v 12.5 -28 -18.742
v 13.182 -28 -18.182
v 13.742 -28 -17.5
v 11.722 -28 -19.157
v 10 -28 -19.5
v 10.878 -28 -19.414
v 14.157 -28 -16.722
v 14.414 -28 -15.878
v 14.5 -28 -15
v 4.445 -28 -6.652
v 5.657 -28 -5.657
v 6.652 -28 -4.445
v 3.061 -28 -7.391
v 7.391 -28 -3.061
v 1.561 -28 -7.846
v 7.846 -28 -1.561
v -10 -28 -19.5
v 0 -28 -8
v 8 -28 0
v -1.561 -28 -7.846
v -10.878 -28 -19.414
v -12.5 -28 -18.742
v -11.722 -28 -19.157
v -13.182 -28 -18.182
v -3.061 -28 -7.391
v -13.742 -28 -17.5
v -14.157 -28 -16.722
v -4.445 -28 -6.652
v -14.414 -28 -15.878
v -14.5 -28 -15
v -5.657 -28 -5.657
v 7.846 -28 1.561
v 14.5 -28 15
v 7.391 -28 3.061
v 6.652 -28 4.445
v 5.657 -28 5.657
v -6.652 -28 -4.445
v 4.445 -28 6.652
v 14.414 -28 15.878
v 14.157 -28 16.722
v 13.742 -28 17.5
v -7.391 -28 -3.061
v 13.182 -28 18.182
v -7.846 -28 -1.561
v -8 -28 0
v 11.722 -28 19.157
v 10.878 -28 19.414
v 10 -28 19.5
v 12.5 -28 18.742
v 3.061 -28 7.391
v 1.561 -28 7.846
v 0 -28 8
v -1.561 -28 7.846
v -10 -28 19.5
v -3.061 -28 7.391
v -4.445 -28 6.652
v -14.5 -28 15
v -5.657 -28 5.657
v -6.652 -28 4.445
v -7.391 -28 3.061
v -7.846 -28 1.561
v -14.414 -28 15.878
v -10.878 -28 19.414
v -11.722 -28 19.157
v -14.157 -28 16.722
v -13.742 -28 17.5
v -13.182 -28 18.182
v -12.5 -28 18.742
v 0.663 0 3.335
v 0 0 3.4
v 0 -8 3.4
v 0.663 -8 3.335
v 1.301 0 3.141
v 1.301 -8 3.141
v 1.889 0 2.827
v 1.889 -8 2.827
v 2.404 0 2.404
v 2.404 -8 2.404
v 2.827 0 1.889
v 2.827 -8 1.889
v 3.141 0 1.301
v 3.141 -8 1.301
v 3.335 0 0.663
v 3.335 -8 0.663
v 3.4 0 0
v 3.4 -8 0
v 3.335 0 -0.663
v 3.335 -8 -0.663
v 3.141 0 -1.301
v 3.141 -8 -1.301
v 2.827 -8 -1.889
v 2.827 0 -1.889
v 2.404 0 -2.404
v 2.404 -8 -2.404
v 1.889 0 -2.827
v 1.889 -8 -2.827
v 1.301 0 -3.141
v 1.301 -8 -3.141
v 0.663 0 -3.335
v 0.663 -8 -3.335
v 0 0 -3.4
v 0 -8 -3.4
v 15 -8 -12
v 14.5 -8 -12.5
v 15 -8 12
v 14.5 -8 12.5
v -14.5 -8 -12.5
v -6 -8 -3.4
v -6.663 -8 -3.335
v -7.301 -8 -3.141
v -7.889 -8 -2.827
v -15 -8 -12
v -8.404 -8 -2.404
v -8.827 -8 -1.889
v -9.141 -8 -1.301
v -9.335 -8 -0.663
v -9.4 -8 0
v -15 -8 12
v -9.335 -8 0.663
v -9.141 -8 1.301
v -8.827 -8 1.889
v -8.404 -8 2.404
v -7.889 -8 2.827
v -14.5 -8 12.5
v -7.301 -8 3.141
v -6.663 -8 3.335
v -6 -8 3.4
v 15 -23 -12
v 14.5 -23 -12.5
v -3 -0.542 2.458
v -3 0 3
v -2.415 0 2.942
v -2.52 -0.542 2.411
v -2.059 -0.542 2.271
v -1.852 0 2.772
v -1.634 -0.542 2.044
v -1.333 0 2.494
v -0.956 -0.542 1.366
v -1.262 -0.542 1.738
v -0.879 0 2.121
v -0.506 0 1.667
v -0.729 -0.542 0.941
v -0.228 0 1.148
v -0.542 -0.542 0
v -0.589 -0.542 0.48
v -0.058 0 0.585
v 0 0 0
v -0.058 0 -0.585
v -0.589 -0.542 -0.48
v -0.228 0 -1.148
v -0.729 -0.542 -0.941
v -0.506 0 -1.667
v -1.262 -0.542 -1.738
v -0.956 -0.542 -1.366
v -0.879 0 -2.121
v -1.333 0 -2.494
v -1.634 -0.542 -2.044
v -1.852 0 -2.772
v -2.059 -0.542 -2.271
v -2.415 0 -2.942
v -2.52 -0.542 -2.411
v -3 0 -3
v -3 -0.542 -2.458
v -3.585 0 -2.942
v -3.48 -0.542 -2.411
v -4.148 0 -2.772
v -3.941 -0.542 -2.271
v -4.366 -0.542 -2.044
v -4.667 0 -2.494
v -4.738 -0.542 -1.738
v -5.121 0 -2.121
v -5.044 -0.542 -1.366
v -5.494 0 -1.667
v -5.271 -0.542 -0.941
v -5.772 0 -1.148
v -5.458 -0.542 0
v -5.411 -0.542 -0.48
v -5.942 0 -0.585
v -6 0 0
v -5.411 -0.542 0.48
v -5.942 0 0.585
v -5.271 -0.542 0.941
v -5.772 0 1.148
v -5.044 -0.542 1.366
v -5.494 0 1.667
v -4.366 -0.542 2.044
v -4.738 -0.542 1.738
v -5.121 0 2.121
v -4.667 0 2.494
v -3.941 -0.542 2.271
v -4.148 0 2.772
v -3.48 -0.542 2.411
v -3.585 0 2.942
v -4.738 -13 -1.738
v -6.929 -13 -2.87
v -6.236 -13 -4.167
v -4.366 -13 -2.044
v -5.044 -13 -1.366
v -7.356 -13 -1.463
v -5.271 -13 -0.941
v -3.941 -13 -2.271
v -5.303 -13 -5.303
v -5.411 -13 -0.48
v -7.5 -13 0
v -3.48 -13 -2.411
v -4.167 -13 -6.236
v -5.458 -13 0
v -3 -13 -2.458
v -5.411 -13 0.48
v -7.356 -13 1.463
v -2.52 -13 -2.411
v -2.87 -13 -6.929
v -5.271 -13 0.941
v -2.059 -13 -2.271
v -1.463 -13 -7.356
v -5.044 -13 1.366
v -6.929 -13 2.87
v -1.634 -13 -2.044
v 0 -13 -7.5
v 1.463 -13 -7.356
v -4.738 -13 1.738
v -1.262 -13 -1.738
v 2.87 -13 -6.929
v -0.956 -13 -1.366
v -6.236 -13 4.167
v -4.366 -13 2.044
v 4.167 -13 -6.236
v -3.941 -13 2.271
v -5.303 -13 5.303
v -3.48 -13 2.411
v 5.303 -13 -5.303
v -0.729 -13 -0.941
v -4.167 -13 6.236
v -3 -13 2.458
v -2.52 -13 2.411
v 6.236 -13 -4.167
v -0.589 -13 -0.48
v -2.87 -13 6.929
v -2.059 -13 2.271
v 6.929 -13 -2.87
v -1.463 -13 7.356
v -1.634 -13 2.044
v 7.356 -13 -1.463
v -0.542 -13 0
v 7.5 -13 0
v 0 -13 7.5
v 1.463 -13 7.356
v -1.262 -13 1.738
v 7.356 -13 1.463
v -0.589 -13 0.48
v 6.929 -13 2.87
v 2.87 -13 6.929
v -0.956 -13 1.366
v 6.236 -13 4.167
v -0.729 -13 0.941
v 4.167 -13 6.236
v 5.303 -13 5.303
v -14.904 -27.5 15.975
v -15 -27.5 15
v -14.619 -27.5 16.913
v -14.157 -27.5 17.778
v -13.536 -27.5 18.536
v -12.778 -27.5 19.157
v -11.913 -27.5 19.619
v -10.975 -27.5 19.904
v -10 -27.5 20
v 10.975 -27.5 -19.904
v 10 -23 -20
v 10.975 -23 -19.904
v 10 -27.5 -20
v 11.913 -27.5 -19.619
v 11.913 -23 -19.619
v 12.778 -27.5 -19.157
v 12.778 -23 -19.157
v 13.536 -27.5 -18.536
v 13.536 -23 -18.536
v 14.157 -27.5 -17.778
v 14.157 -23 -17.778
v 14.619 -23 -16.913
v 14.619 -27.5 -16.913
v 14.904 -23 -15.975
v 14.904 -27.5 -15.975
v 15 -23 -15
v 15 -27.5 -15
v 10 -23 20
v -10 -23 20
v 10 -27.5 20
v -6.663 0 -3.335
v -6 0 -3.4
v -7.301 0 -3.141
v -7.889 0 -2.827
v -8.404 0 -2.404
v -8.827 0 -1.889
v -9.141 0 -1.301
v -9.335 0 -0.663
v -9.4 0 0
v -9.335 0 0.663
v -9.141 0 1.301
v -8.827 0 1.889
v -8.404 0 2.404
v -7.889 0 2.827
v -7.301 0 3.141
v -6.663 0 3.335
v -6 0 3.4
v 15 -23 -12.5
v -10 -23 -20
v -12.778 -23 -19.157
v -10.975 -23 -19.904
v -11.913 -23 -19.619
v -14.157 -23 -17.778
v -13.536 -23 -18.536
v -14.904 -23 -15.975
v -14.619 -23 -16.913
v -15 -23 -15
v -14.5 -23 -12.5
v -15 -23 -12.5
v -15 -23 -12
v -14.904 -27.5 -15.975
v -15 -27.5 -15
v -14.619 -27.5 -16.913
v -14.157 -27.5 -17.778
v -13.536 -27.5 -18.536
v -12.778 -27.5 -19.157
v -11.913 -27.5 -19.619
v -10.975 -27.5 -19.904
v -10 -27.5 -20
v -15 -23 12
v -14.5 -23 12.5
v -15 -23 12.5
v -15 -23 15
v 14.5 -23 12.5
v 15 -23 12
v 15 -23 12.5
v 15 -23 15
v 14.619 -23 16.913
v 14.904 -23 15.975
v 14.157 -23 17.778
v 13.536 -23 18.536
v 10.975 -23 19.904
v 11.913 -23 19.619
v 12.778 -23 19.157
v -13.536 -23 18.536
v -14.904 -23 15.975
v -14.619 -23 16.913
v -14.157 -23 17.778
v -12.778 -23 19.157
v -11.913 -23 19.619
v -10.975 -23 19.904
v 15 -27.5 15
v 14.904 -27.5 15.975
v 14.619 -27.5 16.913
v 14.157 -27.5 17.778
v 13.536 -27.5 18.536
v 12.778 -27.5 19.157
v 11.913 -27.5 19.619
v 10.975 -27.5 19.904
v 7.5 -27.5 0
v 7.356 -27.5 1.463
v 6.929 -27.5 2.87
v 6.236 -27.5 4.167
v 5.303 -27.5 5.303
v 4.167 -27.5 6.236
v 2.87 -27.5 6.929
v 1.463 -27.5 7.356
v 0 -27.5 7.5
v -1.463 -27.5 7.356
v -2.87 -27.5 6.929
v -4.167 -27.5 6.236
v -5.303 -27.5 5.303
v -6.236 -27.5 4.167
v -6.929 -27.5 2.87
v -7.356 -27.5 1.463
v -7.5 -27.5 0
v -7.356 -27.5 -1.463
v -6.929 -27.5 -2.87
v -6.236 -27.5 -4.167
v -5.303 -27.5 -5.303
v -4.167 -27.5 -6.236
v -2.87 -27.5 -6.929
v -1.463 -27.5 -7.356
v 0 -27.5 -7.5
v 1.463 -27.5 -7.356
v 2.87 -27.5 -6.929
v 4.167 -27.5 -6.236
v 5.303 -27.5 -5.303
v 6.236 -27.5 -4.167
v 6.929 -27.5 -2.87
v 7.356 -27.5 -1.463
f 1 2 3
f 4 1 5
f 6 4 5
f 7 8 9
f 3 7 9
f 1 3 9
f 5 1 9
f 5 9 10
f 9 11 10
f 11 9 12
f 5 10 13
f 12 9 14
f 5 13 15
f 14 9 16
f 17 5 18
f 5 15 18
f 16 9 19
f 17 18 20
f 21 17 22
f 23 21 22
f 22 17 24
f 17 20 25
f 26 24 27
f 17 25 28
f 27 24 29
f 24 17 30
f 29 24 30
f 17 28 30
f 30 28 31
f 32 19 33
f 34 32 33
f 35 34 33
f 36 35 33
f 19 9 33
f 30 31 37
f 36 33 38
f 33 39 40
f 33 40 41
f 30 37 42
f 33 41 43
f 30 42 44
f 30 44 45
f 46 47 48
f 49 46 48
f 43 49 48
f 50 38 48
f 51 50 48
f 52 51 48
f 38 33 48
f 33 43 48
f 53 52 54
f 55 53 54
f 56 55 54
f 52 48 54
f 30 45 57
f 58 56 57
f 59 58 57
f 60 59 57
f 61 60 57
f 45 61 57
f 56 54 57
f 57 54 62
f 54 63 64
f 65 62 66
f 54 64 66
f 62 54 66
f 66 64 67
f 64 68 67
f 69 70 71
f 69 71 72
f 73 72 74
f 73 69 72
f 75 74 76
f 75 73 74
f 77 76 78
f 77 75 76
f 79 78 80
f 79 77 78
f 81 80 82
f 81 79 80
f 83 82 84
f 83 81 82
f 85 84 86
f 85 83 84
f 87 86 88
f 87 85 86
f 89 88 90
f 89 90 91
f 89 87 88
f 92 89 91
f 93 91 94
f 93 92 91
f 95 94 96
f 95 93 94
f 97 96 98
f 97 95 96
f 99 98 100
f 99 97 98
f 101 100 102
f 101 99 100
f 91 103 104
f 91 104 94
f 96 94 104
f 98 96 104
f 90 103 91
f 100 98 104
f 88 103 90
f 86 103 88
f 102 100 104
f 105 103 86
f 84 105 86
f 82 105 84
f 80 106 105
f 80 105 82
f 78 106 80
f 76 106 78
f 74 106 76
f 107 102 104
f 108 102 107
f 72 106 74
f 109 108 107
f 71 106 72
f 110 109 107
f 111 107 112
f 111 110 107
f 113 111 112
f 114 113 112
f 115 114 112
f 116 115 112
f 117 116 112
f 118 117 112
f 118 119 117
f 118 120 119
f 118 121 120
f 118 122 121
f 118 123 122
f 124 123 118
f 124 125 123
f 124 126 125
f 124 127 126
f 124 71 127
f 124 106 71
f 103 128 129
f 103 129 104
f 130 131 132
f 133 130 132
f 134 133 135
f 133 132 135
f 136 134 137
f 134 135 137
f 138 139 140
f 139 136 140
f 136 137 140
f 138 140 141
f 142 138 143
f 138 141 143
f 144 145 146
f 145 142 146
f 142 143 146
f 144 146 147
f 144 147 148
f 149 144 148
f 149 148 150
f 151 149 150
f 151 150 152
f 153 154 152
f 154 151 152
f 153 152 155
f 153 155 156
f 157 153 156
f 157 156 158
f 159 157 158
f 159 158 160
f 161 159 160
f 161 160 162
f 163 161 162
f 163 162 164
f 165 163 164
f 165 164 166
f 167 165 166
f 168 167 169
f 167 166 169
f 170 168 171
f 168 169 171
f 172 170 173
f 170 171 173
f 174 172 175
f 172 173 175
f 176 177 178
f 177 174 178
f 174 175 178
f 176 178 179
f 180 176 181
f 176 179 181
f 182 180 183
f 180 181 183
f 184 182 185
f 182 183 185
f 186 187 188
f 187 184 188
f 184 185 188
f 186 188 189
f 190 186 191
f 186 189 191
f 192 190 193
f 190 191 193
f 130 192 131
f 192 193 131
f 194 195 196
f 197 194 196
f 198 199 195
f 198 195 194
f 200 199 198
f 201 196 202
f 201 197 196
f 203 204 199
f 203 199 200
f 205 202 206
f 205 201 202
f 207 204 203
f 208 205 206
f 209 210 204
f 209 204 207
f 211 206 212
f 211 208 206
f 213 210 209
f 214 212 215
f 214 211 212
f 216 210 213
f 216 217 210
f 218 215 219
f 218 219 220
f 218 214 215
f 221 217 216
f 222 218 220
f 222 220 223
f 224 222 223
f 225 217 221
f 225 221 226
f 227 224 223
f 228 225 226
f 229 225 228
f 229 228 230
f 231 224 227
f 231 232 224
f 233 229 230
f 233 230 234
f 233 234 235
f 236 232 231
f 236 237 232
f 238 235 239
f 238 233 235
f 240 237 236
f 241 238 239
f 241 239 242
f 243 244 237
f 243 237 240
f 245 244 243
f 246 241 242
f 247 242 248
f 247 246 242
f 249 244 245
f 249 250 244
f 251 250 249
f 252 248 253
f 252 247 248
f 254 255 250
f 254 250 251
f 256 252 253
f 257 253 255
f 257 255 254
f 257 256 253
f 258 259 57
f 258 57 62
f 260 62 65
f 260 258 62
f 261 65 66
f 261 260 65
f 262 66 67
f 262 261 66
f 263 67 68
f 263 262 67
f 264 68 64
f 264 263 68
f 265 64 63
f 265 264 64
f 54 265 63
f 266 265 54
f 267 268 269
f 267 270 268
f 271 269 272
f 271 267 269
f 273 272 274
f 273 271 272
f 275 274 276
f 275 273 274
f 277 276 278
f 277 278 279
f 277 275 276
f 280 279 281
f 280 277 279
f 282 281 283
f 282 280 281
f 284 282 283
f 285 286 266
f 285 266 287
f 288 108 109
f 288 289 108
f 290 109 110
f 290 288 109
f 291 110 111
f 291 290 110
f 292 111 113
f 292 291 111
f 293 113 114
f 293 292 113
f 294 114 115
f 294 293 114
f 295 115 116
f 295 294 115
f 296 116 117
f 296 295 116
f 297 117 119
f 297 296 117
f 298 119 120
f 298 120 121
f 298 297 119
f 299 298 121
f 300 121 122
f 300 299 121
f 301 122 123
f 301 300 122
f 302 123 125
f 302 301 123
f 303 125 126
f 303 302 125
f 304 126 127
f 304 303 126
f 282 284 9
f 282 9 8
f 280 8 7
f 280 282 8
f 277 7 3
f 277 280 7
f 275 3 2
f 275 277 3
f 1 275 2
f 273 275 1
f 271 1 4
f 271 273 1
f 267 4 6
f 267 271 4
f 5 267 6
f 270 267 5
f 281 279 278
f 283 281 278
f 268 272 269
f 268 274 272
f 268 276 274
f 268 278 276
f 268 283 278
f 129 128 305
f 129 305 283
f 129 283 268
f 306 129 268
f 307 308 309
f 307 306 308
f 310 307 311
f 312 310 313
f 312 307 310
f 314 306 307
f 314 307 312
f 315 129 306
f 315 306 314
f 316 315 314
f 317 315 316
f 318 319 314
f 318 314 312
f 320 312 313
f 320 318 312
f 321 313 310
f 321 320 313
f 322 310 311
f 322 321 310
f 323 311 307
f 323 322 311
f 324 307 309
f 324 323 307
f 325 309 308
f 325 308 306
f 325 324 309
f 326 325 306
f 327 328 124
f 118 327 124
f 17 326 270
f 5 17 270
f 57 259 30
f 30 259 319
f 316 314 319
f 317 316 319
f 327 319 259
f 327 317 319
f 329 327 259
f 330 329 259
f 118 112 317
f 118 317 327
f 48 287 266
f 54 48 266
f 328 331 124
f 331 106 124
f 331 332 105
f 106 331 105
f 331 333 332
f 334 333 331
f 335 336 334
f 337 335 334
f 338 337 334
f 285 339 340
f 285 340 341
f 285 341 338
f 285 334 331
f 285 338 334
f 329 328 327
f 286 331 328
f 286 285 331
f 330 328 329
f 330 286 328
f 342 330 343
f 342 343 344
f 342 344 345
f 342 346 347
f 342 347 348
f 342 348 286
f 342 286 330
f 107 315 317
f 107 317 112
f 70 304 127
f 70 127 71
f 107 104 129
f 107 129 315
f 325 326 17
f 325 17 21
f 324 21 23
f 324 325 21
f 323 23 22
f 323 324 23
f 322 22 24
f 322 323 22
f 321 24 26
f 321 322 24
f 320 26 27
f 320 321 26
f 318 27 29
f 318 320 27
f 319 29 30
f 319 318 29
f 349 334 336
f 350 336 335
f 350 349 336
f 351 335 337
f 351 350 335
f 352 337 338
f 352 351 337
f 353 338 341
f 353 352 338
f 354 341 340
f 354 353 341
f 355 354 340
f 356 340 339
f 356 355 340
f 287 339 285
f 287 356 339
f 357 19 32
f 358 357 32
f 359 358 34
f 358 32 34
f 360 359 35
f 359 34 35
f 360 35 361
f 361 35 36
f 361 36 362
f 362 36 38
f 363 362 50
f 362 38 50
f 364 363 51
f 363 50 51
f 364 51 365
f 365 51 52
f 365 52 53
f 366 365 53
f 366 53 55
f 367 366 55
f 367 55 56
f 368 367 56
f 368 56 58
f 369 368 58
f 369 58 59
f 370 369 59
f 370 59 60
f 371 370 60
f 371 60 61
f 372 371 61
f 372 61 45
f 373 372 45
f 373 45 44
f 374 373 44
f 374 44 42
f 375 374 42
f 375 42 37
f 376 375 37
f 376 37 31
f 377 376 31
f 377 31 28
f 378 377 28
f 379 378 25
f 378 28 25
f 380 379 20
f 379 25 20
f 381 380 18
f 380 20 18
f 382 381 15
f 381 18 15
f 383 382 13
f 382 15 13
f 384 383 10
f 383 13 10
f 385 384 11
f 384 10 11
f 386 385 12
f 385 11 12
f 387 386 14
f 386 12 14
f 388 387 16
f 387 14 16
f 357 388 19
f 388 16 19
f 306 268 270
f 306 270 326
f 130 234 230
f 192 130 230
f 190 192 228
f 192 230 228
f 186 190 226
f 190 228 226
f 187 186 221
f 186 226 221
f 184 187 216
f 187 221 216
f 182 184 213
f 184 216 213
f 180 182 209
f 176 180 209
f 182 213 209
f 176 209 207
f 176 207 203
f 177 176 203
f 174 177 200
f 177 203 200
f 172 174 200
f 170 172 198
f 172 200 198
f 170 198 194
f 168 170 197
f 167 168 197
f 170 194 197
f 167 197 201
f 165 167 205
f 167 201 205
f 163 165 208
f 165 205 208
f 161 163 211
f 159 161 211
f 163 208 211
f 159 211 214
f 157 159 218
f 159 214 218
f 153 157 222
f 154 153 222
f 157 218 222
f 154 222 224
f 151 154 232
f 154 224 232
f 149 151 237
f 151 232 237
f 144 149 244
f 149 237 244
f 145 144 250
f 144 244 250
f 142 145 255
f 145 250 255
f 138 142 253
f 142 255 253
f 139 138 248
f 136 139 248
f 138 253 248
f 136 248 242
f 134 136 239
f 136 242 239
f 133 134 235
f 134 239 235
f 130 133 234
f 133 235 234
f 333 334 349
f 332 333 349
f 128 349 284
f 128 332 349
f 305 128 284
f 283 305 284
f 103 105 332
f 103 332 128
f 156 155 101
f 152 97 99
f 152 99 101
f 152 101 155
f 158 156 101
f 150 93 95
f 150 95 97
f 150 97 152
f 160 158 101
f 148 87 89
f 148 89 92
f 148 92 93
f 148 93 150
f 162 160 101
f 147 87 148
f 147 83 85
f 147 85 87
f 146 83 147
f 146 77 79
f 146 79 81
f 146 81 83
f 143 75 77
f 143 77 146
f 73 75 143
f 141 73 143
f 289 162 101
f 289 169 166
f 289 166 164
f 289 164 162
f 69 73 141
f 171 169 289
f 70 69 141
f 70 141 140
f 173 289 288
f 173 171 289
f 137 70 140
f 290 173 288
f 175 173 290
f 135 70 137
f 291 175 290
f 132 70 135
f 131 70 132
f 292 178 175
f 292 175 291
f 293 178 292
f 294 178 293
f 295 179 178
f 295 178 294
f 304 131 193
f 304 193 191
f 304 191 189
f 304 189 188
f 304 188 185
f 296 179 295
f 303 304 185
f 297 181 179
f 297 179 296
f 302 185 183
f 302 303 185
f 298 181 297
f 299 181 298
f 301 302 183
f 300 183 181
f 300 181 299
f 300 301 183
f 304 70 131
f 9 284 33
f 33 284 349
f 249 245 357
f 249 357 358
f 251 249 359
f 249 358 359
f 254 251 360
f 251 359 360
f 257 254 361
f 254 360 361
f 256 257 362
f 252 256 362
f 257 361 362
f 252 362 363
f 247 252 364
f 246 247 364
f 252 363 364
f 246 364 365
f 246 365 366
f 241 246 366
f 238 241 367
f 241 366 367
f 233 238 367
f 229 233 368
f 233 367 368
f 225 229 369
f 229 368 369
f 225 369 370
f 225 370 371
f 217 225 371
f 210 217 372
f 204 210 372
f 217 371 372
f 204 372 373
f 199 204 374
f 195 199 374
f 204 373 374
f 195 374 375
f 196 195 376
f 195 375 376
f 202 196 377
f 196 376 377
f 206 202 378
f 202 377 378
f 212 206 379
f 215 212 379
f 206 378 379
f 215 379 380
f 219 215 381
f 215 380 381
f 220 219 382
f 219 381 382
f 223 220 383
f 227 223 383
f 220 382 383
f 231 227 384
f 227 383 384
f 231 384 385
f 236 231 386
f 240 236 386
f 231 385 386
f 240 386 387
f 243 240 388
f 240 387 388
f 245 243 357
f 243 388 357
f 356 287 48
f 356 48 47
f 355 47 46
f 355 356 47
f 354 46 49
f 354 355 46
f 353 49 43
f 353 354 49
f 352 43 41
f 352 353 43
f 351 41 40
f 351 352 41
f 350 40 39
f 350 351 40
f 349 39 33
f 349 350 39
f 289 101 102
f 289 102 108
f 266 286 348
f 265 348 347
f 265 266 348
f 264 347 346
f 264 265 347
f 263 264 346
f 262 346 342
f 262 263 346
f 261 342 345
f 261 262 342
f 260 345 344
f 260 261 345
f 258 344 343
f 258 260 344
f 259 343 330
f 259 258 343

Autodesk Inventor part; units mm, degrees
ref_plane "YZ Plane" through (0, 0, 0) normal (1, 0, 0) x (0, 1, 0)
ref_plane "XZ Plane" through (0, 0, 0) normal (0, 1, 0) x (-1, 0, 0)
ref_plane "XY Plane" through (0, 0, 0) normal (0, 0, 1) x (1, 0, 0)
sketch "Sketch1" plane through (0, 0, 0) normal (0, 1, 0) x (-1, 0, 0)
  line L0 (15, 20) -> (-15, 20)
  line L1 (-15, 20) -> (-15, -20)
  line L2 (-15, -20) -> (15, -20)
  line L3 (15, -20) -> (15, 20)
  line L4 (15, 20) -> (-15, -20) construction
  line L5 (-15, 20) -> (15, -20) construction
  line L6 (21, 0) -> (-21, 0) construction
  line L7 (0, -28) -> (0, 28) construction
  line L8 (6, 0) -> (0, 0) construction
  line L9 (6, 3.4) -> (0, 3.4)
  line L10 (0, -3.4) -> (6, -3.4)
  arc A0 (6, -3.4) -> (6, 3.4) centre (6, 0) ccw
  arc A1 (0, 3.4) -> (0, -3.4) centre (0, 0) ccw
  line L11 (-15, 12.5) -> (15, 12.5)
  line L12 (-15, -12.5) -> (15, -12.5)
  point P0 (0, 0)
  point P1 (3, 0)
  point P2 (3, 0)
  point P3 (15, -12.5)
  dimension "d0" = 40
  dimension "d1" = 30
  dimension "d2" = 6
  dimension "d3" = 6.8
  dimension "d19" = 3
  dimension "d35" = 25
extrude "Extrusion1" add sketch "Sketch1" against normal blind 28 contours L3 L11 L1 L0 | L3 L12 L1 L11 | L3 L2 L1 L12 | A0 L10 A1 L9
extrude "Extrusion2" cut sketch "Sketch1" against normal blind 8
sketch "Sketch3" plane through (0, -28, 0) normal (0, -1, 0) x (1, 0, 0)
  circle A0 centre (0, 0) radius 7.5
  dimension "d29" = 15
extrude "Extrusion5" cut sketch "Sketch3" against normal blind 15
extrude "Extrusion6" cut sketch "Sketch1" against normal blind 23 contours L3 L11 L1 L0 | L3 L2 L1 L12
hole "Hole1" at (-3, 0, 0) direction (0, -1, 0) diameter 4.917 depth 13 countersink diameter 6 countersink angle 90 thread size "M6x1" class "6H" standard "ISO Metric profile"
fillet "Fillet1" radius 5 4 edges at (-15, -25.5, 20) (-15, -25.5, -20) (15, -25.5, -20) (15, -25.5, 20)
chamfer "Chamfer1" distance 0.5 angle 45 13 edges at (0, -28, 20) (-13.5355, -28, 18.5355) (-15, -28, 0) (-13.5355, -28, -18.5355) (0, -28, -20) (13.5355, -28, -18.5355) (15, -28, 0) (13.5355, -28, 18.5355) (-7.5, -28, 0) (-15, -15.5, 12.5) (-15, -15.5, -12.5) (15, -15.5, -12.5) (15, -15.5, 12.5)
equation "\"d4\" = slotTabH + sheetT"
equation "\"d6\" = slotTabH"
equation "\"slotTabH\" = 8"
equation "\"sheetT\" = 20"
equation "\"totalHeight\" = slotTabH + sheetT"
properties part number "TCSM1-X-003" material "Steel"
